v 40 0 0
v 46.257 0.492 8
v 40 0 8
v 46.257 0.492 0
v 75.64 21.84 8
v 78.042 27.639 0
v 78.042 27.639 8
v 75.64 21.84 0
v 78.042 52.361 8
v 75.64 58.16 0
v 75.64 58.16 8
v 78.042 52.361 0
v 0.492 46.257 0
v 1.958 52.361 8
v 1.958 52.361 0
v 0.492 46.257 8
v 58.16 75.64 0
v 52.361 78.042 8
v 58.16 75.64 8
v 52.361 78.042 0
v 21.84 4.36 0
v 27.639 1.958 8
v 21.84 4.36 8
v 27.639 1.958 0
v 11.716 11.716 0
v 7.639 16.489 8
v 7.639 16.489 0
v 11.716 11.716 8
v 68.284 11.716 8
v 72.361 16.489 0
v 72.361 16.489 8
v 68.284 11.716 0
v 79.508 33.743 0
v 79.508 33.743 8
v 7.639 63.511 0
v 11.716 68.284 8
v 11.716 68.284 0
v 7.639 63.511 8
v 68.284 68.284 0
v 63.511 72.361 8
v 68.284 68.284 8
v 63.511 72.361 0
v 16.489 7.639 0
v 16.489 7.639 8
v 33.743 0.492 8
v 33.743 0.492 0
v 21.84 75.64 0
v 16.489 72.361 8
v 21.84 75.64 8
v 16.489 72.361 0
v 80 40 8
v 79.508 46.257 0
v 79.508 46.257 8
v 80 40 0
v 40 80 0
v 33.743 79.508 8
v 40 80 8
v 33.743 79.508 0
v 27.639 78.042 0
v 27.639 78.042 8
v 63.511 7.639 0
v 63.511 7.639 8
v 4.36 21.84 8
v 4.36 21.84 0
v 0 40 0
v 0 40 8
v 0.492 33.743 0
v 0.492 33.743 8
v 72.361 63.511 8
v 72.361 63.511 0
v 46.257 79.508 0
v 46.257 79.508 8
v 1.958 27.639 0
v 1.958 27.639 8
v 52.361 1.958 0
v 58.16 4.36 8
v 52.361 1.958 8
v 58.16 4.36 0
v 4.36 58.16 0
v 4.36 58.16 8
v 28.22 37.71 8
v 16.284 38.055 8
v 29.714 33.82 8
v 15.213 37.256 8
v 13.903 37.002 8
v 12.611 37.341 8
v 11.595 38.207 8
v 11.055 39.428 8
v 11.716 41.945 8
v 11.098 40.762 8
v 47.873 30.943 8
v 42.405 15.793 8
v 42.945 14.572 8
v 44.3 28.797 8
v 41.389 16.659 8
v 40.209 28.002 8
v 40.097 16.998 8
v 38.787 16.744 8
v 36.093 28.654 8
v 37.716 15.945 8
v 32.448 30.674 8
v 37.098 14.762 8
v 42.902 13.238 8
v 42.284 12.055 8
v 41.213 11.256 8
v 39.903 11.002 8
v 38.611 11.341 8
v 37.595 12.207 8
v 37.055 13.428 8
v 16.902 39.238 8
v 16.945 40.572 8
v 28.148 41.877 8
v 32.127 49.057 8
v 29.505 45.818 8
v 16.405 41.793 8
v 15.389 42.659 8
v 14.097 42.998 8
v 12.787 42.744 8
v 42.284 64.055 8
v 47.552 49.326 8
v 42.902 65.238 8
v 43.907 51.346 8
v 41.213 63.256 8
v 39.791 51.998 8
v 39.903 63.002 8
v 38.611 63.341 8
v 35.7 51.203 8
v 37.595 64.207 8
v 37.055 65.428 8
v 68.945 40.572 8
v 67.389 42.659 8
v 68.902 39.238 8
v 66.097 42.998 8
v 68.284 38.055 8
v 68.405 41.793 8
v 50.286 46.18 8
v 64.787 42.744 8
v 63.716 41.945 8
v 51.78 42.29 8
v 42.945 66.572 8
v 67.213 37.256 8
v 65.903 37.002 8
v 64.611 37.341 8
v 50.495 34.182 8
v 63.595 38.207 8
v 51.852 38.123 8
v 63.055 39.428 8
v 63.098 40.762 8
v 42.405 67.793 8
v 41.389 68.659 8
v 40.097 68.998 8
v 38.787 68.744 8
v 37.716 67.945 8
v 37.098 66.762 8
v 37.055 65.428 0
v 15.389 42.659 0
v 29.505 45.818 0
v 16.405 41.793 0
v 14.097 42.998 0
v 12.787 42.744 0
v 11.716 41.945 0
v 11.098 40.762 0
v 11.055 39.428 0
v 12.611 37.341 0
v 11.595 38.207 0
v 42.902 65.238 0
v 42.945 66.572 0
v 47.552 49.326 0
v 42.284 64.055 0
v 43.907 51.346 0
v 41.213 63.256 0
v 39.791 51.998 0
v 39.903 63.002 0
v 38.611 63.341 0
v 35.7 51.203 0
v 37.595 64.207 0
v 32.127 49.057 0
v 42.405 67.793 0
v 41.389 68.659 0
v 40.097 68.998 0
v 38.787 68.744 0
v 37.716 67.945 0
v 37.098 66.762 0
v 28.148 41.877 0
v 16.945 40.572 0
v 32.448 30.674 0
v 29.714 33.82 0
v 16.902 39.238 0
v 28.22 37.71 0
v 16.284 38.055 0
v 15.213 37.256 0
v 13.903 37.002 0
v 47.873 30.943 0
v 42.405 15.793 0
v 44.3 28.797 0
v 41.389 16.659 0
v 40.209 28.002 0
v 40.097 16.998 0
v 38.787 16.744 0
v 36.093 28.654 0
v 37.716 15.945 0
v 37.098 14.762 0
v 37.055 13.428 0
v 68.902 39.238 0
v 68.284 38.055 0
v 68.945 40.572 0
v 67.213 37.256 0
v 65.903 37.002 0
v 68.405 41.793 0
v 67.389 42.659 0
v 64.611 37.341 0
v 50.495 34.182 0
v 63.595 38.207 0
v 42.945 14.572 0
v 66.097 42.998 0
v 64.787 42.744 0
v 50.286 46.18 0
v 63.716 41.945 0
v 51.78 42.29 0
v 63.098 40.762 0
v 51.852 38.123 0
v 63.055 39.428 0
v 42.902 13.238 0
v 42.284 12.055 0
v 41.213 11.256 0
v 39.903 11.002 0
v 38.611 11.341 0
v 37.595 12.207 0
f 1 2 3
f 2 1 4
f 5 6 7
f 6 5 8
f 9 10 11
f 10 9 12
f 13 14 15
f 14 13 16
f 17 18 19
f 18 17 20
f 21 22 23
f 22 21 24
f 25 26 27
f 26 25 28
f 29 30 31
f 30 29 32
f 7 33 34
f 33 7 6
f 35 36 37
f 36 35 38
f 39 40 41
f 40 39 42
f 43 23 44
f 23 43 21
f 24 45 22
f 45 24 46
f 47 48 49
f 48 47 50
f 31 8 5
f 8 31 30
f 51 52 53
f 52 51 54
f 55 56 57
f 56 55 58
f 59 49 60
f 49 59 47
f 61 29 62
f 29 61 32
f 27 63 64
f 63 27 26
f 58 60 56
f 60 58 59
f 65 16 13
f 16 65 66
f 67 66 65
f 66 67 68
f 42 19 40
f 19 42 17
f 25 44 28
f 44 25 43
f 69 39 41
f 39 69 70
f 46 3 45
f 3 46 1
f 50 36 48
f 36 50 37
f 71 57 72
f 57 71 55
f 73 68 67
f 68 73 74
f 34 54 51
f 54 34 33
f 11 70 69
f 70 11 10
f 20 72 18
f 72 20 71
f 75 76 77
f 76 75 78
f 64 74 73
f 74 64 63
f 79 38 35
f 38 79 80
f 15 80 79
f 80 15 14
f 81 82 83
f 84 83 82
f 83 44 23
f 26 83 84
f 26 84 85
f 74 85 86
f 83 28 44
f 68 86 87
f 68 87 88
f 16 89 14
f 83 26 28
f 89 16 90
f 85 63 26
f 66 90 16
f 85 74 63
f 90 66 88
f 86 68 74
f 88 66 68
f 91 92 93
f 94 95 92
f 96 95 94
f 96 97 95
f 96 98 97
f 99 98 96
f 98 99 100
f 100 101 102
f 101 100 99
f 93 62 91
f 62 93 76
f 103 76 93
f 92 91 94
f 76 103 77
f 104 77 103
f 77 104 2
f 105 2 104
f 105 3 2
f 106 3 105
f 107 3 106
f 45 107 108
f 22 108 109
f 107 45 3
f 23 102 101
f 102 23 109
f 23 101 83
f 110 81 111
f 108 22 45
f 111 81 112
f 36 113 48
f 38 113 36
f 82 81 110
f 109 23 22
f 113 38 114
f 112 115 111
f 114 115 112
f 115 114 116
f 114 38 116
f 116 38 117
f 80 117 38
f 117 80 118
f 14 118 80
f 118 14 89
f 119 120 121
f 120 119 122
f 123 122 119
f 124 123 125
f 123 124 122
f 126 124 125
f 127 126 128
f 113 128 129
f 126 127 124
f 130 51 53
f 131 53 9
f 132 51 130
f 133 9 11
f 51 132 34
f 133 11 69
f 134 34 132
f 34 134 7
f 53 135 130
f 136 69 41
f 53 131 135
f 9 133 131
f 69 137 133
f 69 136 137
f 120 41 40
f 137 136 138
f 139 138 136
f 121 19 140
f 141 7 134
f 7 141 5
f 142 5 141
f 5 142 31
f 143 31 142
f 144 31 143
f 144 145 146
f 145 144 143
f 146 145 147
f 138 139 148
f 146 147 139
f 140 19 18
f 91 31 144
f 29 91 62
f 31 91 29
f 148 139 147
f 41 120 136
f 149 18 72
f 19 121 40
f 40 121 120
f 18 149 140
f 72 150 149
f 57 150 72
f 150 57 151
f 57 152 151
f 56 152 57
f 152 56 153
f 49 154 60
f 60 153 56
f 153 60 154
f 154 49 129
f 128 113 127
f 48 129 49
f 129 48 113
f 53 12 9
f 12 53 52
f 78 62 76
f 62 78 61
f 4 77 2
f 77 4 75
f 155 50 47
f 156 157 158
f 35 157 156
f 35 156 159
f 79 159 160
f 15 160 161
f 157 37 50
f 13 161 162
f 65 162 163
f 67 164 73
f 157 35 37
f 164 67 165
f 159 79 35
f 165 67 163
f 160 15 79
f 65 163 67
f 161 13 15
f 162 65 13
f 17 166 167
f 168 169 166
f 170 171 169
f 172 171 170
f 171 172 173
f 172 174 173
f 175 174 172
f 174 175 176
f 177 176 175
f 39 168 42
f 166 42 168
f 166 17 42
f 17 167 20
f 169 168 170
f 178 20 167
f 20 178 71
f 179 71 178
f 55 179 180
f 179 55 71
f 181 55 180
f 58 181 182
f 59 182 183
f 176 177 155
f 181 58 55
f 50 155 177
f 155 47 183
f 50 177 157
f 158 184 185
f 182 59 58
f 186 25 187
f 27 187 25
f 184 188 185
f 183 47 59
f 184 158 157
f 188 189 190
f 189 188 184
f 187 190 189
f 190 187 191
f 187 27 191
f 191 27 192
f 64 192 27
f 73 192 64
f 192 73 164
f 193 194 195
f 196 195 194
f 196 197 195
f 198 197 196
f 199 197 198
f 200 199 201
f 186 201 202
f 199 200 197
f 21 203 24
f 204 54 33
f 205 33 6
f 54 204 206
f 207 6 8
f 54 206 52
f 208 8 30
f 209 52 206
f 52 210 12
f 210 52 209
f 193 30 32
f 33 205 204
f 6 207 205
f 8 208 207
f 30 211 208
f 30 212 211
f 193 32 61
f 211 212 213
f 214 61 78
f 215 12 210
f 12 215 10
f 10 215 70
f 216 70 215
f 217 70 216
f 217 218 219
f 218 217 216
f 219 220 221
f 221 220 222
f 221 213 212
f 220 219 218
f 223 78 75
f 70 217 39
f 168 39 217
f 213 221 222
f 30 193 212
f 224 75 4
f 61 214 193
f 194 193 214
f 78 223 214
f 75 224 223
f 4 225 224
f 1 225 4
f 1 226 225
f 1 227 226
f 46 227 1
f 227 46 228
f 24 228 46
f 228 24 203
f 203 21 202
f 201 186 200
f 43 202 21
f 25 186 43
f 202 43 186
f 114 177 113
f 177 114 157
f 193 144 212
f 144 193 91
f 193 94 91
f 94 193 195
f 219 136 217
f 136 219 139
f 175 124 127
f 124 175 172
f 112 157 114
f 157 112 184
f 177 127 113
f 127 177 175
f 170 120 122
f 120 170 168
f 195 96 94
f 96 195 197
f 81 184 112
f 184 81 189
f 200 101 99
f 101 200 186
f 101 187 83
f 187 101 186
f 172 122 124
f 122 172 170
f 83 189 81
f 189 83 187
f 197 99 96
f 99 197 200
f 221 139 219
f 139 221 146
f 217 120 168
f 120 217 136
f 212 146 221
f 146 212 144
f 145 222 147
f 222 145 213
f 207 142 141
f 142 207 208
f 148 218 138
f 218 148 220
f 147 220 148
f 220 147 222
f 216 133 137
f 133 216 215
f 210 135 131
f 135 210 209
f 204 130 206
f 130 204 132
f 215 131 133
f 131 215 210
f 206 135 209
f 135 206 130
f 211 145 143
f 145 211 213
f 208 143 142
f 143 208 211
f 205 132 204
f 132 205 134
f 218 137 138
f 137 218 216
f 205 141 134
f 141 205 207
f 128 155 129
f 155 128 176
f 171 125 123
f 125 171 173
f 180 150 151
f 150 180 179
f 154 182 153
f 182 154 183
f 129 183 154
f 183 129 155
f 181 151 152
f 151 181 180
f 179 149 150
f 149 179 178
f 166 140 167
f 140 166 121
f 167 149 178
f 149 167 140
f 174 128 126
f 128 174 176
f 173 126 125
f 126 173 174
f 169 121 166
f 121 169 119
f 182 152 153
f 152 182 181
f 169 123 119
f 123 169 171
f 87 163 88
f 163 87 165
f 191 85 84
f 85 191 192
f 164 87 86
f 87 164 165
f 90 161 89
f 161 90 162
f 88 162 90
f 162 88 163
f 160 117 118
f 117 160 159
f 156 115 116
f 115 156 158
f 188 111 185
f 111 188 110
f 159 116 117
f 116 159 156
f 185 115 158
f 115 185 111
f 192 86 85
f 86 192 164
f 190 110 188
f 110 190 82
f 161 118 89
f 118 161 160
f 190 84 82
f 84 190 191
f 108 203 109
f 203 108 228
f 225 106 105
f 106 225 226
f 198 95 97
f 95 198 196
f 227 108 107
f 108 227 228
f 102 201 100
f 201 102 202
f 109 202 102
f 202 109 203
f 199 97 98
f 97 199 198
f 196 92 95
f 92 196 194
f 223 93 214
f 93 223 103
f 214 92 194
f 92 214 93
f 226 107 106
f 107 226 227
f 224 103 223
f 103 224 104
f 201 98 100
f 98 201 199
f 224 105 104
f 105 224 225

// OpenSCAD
$fn = 32;

// ----------------------------------------------------------------------
// Spacer plate: round flange R40, 4 bolts
// ----------------------------------------------------------------------

// --- parameters (mm) ---
bore_r = 12;              // centre bore radius
bolt_r = 3;               // bolt hole radius
plate_t = 8;              // plate thickness, Z (extrusion height)
flange_r = 40;            // flange radius
n_bolt = 4;               // bolt hole count
ring_r = 26;              // bolt circle radius

profile = [[80, 40], [79.508, 46.257], [78.042, 52.361], [75.64, 58.16], [72.361, 63.511], [68.284, 68.284], [63.511, 72.361], [58.16, 75.64], [52.361, 78.042], [46.257, 79.508], [40, 80], [33.743, 79.508], [27.639, 78.042], [21.84, 75.64], [16.489, 72.361], [11.716, 68.284], [7.639, 63.511], [4.36, 58.16], [1.958, 52.361], [0.492, 46.257], [0, 40], [0.492, 33.743], [1.958, 27.639], [4.36, 21.84], [7.639, 16.489], [11.716, 11.716], [16.489, 7.639], [21.84, 4.36], [27.639, 1.958], [33.743, 0.492], [40, 0], [46.257, 0.492], [52.361, 1.958], [58.16, 4.36], [63.511, 7.639], [68.284, 11.716], [72.361, 16.489], [75.64, 21.84], [78.042, 27.639], [79.508, 33.743]];  // primary outline, 40 points, counter clockwise
void_1 = [[51.78, 42.29], [50.286, 46.18], [47.552, 49.326], [43.907, 51.346], [39.791, 51.998], [35.7, 51.203], [32.127, 49.057], [29.505, 45.818], [28.148, 41.877], [28.22, 37.71], [29.714, 33.82], [32.448, 30.674], [36.093, 28.654], [40.209, 28.002], [44.3, 28.797], [47.873, 30.943], [50.495, 34.182], [51.852, 38.123]];  // centre bore, 18 points
void_2 = [[68.945, 40.572], [68.405, 41.793], [67.389, 42.659], [66.097, 42.998], [64.787, 42.744], [63.716, 41.945], [63.098, 40.762], [63.055, 39.428], [63.595, 38.207], [64.611, 37.341], [65.903, 37.002], [67.213, 37.256], [68.284, 38.055], [68.902, 39.238]];  // bolt hole 1, 14 points
void_3 = [[42.945, 66.572], [42.405, 67.793], [41.389, 68.659], [40.097, 68.998], [38.787, 68.744], [37.716, 67.945], [37.098, 66.762], [37.055, 65.428], [37.595, 64.207], [38.611, 63.341], [39.903, 63.002], [41.213, 63.256], [42.284, 64.055], [42.902, 65.238]];  // bolt hole 2, 14 points
void_4 = [[16.945, 40.572], [16.405, 41.793], [15.389, 42.659], [14.097, 42.998], [12.787, 42.744], [11.716, 41.945], [11.098, 40.762], [11.055, 39.428], [11.595, 38.207], [12.611, 37.341], [13.903, 37.002], [15.213, 37.256], [16.284, 38.055], [16.902, 39.238]];  // bolt hole 3, 14 points
void_5 = [[42.945, 14.572], [42.405, 15.793], [41.389, 16.659], [40.097, 16.998], [38.787, 16.744], [37.716, 15.945], [37.098, 14.762], [37.055, 13.428], [37.595, 12.207], [38.611, 11.341], [39.903, 11.002], [41.213, 11.256], [42.284, 12.055], [42.902, 13.238]];  // bolt hole 4, 14 points

// --- the one profile operation ---
difference() {
  linear_extrude(height = plate_t) polygon(points = profile);
  translate([0, 0, -1])
    linear_extrude(height = plate_t + 2) polygon(points = void_1);
  translate([0, 0, -1])
    linear_extrude(height = plate_t + 2) polygon(points = void_2);
  translate([0, 0, -1])
    linear_extrude(height = plate_t + 2) polygon(points = void_3);
  translate([0, 0, -1])
    linear_extrude(height = plate_t + 2) polygon(points = void_4);
  translate([0, 0, -1])
    linear_extrude(height = plate_t + 2) polygon(points = void_5);
}
